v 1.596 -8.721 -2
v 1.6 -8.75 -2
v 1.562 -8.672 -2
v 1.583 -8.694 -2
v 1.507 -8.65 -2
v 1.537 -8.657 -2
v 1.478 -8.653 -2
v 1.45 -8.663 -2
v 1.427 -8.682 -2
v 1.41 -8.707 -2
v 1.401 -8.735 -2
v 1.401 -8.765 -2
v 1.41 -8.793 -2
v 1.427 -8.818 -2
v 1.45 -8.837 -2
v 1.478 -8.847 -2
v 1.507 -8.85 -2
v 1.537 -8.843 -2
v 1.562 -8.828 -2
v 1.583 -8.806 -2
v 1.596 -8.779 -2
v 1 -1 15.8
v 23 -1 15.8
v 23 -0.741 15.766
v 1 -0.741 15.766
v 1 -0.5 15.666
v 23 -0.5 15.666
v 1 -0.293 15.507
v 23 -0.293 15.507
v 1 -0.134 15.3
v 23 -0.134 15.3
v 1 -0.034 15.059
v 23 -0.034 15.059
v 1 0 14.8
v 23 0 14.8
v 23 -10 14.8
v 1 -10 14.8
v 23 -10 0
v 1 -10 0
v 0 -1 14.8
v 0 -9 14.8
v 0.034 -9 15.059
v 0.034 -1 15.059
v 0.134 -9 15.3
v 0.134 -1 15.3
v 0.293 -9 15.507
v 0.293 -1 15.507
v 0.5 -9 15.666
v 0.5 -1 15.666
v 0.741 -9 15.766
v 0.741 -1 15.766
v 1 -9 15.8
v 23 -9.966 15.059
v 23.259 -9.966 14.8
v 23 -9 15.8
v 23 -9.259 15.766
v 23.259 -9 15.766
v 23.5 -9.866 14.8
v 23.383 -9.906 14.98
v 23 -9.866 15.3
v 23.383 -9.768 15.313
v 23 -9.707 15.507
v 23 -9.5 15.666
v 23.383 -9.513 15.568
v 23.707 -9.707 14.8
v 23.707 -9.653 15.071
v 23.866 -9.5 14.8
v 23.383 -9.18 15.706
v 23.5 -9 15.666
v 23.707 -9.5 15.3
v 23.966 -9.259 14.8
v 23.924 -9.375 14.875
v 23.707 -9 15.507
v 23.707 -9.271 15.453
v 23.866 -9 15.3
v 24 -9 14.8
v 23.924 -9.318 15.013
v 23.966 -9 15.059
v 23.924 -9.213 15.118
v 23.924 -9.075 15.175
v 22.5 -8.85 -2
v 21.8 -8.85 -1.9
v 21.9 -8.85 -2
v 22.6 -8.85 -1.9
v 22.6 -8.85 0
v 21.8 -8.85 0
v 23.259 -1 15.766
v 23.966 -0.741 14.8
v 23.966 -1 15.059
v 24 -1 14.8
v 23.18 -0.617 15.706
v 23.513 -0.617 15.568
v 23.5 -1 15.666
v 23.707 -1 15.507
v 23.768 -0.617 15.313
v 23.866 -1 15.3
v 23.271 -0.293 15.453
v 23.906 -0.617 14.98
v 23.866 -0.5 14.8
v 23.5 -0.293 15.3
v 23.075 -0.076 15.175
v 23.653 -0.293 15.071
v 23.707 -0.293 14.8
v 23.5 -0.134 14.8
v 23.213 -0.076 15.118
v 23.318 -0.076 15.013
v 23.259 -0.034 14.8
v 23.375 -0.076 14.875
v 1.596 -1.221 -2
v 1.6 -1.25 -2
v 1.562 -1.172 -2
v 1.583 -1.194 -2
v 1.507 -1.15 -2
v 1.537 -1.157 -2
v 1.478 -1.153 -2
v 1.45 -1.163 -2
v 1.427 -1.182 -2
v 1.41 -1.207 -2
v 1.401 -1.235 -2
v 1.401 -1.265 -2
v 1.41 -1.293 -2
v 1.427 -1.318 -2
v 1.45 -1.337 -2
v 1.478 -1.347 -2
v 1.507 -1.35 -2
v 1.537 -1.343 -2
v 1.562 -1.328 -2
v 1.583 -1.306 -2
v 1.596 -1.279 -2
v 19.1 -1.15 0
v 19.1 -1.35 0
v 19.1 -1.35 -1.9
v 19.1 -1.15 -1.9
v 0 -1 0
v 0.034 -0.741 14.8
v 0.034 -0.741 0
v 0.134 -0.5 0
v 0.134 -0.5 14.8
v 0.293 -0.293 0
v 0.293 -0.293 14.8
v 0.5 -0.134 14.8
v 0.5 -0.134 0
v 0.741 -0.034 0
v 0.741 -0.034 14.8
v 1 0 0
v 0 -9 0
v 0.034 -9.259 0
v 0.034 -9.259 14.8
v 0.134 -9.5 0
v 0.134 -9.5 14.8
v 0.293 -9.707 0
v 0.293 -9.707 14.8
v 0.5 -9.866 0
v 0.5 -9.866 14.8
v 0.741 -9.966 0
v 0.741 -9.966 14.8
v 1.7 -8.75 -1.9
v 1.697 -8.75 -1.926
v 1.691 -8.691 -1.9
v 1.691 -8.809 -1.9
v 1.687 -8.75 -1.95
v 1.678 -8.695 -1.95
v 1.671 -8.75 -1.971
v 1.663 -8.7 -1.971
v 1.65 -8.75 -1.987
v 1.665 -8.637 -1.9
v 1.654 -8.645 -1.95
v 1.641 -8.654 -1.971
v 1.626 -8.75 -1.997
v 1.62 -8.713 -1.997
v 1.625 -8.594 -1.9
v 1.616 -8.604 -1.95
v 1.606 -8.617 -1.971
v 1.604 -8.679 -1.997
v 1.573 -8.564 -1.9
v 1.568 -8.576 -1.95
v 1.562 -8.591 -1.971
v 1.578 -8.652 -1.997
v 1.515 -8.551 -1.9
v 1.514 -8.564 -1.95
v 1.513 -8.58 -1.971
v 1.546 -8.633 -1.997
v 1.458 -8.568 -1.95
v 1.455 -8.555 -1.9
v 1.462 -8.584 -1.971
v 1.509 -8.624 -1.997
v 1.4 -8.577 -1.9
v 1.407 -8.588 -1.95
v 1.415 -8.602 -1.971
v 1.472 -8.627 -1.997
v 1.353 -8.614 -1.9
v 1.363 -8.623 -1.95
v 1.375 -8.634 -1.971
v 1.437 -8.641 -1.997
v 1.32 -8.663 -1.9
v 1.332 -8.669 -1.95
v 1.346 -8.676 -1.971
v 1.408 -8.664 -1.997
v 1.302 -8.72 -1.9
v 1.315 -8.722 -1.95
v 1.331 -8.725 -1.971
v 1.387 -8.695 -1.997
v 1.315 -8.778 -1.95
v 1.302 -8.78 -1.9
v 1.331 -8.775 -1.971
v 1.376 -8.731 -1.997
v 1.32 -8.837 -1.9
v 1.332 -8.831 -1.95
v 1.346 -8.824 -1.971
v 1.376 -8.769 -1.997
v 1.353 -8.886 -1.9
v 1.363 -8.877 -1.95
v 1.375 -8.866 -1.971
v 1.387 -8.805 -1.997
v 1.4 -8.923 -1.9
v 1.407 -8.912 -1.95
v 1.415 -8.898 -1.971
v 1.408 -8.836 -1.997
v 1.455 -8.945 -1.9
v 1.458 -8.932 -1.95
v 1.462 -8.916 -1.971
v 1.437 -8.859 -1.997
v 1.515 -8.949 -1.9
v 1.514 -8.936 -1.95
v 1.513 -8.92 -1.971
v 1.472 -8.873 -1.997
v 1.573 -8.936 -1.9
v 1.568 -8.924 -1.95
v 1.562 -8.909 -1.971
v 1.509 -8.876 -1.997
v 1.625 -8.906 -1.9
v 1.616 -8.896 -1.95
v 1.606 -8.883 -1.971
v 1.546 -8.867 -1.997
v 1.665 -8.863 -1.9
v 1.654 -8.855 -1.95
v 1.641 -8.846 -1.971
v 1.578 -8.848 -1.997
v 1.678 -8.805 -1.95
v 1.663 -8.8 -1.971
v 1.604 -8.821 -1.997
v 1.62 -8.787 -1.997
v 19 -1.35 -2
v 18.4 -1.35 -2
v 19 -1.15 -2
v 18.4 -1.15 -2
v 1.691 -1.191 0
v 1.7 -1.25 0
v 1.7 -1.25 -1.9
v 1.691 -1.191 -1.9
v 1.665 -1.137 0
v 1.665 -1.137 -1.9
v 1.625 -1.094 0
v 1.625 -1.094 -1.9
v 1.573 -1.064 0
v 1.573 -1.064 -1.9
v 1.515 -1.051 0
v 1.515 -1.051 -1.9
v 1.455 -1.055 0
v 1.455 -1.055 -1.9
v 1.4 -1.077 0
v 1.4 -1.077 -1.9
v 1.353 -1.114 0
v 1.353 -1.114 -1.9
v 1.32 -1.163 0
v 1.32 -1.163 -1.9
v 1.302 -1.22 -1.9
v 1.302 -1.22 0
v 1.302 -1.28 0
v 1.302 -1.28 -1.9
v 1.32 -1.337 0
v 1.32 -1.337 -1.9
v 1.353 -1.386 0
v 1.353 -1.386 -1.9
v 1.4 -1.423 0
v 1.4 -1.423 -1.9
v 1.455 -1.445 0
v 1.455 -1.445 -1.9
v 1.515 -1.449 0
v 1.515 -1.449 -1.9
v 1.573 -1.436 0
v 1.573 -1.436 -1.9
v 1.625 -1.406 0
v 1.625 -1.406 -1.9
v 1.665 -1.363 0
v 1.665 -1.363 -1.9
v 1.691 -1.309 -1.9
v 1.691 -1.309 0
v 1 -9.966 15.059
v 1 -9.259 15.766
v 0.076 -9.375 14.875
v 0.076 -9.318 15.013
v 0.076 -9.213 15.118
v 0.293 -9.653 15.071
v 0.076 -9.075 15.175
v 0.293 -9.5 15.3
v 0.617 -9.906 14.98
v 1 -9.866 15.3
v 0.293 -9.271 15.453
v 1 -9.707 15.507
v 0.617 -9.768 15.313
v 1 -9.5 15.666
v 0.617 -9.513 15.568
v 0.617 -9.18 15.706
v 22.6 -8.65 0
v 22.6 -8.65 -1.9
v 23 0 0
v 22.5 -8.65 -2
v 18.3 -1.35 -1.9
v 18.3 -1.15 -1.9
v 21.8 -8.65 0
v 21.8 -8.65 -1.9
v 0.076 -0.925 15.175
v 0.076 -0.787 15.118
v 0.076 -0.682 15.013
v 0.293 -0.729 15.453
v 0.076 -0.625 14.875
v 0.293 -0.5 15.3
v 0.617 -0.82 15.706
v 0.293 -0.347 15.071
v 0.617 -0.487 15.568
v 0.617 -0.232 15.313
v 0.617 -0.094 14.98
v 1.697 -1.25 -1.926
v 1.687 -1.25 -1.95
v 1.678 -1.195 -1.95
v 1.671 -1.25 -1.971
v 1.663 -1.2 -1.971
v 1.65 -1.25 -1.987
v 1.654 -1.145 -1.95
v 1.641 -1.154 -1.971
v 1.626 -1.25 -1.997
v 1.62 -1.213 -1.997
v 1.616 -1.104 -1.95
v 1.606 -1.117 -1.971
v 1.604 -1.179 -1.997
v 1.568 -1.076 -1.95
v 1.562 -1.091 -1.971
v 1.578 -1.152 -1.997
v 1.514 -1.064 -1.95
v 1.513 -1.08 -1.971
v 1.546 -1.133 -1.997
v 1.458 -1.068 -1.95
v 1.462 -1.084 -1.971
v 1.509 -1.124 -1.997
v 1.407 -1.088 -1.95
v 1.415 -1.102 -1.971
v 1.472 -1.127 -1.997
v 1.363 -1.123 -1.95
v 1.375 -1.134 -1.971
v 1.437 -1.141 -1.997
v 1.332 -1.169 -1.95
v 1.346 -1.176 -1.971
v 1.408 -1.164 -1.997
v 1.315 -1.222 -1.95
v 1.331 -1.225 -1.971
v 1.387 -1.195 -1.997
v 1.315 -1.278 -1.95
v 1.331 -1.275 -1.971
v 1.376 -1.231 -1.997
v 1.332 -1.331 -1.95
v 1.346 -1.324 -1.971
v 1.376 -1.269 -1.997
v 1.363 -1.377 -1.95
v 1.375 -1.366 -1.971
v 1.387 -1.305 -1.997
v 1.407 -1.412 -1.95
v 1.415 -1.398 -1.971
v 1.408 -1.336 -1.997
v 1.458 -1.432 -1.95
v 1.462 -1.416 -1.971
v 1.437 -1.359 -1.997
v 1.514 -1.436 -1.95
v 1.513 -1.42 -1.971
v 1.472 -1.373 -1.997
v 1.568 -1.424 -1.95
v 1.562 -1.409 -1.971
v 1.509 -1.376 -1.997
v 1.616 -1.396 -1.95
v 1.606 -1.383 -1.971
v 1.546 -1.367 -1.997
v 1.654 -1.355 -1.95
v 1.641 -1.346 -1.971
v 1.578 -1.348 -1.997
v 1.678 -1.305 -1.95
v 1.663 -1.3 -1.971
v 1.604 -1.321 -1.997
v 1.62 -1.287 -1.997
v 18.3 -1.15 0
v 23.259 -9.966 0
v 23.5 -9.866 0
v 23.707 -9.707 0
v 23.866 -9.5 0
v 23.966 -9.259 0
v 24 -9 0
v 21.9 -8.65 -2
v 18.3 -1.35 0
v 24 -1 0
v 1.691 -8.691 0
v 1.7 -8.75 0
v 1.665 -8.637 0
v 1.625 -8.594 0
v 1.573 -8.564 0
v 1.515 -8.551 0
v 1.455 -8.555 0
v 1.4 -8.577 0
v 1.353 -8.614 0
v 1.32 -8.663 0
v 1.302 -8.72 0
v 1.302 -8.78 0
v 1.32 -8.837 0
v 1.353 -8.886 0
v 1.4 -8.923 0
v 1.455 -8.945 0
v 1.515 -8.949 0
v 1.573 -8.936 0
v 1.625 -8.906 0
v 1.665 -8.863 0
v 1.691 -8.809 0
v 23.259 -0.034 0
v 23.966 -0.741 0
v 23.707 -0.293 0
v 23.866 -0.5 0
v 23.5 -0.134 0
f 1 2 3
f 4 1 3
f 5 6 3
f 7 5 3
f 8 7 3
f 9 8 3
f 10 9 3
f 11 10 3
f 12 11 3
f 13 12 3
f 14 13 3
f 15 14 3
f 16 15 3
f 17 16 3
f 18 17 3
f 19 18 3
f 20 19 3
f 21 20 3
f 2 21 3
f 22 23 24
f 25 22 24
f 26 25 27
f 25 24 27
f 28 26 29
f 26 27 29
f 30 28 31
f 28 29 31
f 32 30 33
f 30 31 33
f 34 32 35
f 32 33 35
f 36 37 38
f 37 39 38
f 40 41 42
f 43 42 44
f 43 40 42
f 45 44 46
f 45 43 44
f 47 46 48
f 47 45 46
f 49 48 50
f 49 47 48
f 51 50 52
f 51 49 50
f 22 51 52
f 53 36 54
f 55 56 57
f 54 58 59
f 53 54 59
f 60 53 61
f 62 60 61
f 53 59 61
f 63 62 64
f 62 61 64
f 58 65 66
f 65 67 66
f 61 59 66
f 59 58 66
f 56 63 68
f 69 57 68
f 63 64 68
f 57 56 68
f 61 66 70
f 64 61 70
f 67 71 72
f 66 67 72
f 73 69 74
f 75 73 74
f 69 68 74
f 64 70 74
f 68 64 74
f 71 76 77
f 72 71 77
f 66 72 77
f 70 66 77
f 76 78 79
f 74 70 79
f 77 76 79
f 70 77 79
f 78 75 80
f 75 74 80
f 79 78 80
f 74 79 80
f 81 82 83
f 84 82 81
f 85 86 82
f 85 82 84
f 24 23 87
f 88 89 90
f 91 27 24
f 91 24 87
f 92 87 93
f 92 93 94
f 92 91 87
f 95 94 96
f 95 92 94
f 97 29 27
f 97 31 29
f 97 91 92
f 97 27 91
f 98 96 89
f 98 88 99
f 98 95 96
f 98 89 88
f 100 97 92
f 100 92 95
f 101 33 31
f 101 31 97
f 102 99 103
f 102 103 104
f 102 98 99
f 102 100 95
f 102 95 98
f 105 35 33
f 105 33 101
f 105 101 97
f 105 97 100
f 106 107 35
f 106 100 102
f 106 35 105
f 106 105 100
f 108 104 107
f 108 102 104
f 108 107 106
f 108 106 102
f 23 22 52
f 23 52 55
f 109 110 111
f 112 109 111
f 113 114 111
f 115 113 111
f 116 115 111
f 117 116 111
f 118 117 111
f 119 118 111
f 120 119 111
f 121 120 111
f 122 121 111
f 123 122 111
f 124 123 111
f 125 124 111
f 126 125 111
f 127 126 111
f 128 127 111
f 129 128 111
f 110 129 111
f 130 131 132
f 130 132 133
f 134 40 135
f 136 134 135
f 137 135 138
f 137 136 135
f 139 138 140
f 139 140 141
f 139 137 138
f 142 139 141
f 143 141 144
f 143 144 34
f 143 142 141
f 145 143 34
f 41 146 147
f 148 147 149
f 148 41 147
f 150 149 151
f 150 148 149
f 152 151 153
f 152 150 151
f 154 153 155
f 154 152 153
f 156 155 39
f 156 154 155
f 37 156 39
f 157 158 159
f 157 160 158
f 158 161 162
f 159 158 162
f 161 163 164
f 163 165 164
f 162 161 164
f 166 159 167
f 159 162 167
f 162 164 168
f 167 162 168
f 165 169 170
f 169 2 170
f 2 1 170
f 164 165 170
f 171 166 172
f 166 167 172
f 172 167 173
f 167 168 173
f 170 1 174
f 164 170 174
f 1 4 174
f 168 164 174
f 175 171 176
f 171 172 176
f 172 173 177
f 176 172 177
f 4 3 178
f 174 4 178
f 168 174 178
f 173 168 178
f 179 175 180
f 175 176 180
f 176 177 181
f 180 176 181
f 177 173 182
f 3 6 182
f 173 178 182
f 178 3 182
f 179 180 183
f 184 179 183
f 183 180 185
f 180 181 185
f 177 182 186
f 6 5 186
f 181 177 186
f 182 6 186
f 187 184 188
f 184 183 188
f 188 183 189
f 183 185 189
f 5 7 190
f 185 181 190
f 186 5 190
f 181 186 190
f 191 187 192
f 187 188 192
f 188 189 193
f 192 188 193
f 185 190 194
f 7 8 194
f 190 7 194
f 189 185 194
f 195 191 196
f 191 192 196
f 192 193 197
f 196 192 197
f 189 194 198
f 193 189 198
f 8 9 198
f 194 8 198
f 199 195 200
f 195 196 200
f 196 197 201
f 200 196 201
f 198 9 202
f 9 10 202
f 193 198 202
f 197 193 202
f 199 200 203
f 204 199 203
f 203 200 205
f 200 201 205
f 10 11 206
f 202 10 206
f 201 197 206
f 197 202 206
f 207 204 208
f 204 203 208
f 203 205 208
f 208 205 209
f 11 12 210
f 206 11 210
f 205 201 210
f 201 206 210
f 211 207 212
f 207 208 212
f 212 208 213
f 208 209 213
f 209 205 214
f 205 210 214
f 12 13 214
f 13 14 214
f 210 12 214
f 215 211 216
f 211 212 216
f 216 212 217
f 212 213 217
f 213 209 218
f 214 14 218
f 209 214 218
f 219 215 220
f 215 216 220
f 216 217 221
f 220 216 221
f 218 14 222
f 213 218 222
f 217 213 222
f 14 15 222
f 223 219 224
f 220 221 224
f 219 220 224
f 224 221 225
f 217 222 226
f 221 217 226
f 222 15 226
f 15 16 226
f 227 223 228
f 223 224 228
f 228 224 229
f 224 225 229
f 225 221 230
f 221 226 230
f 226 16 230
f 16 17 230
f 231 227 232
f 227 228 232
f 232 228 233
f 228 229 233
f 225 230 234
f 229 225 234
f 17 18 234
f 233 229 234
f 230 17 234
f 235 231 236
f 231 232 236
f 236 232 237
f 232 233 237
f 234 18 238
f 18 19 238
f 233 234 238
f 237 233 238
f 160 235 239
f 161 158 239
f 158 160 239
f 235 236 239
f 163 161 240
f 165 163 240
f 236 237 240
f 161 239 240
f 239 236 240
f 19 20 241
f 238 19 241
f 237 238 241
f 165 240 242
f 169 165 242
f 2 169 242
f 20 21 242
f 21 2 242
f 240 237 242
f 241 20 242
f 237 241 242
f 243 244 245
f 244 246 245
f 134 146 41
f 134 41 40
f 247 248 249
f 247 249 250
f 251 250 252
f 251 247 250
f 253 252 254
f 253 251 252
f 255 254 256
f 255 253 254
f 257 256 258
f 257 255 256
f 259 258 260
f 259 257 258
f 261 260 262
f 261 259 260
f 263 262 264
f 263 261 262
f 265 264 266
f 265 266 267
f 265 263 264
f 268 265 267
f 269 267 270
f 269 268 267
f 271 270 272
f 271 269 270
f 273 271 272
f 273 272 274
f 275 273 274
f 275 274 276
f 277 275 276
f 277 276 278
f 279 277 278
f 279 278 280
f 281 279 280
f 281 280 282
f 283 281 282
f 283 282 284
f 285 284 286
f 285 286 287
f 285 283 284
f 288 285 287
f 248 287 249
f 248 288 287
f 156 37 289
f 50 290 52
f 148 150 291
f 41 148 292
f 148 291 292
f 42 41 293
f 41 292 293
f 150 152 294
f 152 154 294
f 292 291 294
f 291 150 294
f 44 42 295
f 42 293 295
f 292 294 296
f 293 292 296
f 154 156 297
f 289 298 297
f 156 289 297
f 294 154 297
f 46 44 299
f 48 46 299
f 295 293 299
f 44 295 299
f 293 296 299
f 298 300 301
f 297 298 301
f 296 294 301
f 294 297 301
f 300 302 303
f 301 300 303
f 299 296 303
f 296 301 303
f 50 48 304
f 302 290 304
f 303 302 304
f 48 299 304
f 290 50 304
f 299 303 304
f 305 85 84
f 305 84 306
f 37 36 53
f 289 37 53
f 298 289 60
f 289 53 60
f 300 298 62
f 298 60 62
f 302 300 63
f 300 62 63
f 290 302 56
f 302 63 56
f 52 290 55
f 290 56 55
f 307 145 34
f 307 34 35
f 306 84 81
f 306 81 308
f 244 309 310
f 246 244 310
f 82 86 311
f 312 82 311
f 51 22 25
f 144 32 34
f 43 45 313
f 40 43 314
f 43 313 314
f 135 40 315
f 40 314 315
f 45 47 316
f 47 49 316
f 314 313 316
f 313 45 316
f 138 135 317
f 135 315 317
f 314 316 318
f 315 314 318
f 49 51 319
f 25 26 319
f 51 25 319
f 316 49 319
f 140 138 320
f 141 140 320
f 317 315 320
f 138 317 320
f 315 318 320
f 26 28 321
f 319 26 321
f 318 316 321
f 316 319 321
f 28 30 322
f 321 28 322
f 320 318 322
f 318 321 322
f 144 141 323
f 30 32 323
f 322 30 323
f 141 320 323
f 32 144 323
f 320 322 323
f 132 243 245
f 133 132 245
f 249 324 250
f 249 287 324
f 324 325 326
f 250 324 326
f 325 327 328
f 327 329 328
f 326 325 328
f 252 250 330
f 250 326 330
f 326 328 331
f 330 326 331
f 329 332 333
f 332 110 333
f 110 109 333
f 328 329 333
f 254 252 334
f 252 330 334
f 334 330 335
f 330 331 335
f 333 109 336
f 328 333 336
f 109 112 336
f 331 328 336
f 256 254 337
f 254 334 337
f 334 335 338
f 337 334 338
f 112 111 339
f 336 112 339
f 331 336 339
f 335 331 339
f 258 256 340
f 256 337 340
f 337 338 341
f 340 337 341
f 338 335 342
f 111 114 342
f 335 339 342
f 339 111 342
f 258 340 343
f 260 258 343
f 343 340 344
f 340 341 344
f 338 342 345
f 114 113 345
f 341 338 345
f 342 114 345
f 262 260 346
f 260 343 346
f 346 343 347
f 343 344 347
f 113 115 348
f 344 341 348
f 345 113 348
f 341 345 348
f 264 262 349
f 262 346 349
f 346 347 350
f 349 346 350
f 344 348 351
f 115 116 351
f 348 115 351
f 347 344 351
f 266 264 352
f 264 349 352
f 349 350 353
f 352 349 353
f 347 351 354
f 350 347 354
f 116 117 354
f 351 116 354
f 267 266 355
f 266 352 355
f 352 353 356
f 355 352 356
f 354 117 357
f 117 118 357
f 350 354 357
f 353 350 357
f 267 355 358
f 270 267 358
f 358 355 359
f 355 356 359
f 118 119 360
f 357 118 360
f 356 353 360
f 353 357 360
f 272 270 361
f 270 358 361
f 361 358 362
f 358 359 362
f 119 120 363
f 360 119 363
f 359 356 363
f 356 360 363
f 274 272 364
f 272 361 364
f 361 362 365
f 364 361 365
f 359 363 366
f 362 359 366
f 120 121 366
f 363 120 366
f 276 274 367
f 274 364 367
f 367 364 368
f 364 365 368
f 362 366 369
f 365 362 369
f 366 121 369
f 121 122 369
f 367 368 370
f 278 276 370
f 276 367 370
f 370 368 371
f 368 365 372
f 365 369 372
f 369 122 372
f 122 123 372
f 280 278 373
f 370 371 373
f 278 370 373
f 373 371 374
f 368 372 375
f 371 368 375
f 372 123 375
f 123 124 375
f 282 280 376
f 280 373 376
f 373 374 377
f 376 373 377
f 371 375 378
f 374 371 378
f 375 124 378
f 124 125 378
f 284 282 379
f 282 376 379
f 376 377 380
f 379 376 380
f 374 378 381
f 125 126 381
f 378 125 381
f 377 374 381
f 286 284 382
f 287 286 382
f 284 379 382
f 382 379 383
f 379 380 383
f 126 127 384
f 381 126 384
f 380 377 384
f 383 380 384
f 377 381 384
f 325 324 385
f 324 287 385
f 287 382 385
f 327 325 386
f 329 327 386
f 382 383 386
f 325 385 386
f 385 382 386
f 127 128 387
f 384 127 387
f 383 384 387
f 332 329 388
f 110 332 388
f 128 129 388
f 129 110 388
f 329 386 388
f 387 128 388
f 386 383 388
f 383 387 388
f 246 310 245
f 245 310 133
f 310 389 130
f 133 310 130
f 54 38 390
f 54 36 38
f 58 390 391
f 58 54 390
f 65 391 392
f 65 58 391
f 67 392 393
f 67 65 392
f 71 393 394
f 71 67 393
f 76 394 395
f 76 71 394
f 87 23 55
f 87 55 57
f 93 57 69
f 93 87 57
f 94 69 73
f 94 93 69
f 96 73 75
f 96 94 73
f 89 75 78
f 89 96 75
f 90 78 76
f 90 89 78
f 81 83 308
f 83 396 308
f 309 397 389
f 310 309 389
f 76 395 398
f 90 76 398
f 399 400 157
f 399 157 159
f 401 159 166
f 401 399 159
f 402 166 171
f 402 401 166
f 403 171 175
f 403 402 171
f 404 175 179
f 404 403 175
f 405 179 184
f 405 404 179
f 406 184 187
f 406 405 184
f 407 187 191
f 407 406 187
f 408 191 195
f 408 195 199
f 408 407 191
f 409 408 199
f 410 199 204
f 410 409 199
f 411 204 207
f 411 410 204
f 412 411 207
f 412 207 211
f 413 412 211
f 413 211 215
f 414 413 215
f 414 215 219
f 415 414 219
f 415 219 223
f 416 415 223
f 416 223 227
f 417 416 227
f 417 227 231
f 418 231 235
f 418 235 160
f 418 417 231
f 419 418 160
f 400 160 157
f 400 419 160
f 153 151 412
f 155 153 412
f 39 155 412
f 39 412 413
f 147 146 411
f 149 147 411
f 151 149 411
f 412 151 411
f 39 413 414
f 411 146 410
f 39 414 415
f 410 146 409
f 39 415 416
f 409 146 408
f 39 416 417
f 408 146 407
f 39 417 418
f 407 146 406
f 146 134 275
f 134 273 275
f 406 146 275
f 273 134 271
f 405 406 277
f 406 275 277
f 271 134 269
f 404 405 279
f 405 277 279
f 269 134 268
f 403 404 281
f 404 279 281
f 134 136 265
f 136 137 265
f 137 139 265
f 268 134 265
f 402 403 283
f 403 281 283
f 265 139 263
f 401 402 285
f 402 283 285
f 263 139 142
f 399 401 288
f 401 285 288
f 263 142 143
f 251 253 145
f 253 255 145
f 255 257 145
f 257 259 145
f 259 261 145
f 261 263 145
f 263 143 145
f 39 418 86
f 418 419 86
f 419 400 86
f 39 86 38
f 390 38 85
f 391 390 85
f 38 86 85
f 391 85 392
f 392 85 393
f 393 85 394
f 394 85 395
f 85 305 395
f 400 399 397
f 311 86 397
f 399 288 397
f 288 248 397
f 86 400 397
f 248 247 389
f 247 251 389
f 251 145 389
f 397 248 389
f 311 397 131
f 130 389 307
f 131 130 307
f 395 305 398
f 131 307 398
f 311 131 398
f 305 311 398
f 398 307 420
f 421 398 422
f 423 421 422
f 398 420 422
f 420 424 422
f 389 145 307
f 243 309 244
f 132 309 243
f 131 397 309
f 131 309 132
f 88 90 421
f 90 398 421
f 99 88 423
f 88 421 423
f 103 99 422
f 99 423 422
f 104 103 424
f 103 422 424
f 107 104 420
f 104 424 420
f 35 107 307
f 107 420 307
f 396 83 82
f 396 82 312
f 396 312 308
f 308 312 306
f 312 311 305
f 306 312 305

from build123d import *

# Parameters (mm, degrees)
SKETCH_W        = 24
SKETCH_H        = 10
PAD_DEPTH       = 15.8
SKETCH001_R     = 0.2
SKETCH001_W     = 0.8
SKETCH001_H     = 0.2
PAD001_DEPTH    = 2
FILLET_R        = 1
FILLET001_R     = 1
FILLET002_R     = 1
FILLET003_R     = 1
CHAMFER_SIZE    = 0.1
CHAMFER001_SIZE = 0.1
CHAMFER002_SIZE = 0.1
CHAMFER003_SIZE = 0.1
FILLET004_R     = 0.1


with BuildPart() as part:
    # Sketch → Pad (new body)
    with BuildSketch(Plane.XY):
        with Locations((12, -5)):
            Rectangle(SKETCH_W, SKETCH_H)
    extrude(amount=PAD_DEPTH)

    # Sketch001 → Pad001 (join)
    with BuildSketch(Plane.XY):
        with Locations((1.5, -1.25)):
            Circle(SKETCH001_R)
        with Locations((1.5, -8.75)):
            Circle(SKETCH001_R)
        with Locations((18.7, -1.25)):
            Rectangle(SKETCH001_W, SKETCH001_H)
        with Locations((22.2, -8.75)):
            Rectangle(SKETCH001_W, SKETCH001_H)
    extrude(amount=-PAD001_DEPTH)

    # Fillet
    fillet_edges = [part.edges().sort_by_distance(p)[0] for p in [
        (12, -10, 15.8),
    ]]
    fillet(fillet_edges, radius=FILLET_R)

    # Fillet001
    fillet001_edges = [part.edges().sort_by_distance(p)[0] for p in [
        (24, -4.5, 15.8),
    ]]
    fillet(fillet001_edges, radius=FILLET001_R)

    # Fillet002
    fillet002_edges = [part.edges().sort_by_distance(p)[0] for p in [
        (11.5, 0, 15.8),
    ]]
    fillet(fillet002_edges, radius=FILLET002_R)

    # Fillet003
    fillet003_edges = [part.edges().sort_by_distance(p)[0] for p in [
        (0, -5, 15.8),
    ]]
    fillet(fillet003_edges, radius=FILLET003_R)

    # Chamfer
    chamfer_edges = [part.edges().sort_by_distance(p)[0] for p in [
        (19.1, -1.25, -2),
    ]]
    chamfer(chamfer_edges, length=CHAMFER_SIZE)

    # Chamfer001
    chamfer001_edges = [part.edges().sort_by_distance(p)[0] for p in [
        (18.3, -1.25, -2),
    ]]
    chamfer(chamfer001_edges, length=CHAMFER001_SIZE)

    # Chamfer002
    chamfer002_edges = [part.edges().sort_by_distance(p)[0] for p in [
        (21.8, -8.75, -2),
    ]]
    chamfer(chamfer002_edges, length=CHAMFER002_SIZE)

    # Chamfer003
    chamfer003_edges = [part.edges().sort_by_distance(p)[0] for p in [
        (22.6, -8.75, -2),
    ]]
    chamfer(chamfer003_edges, length=CHAMFER003_SIZE)

    # Fillet004
    fillet004_edges = [part.edges().sort_by_distance(p)[0] for p in [
        (1.3, -8.75, -2),
        (1.3, -1.25, -2),
    ]]
    fillet(fillet004_edges, radius=FILLET004_R)


solid = part.part
